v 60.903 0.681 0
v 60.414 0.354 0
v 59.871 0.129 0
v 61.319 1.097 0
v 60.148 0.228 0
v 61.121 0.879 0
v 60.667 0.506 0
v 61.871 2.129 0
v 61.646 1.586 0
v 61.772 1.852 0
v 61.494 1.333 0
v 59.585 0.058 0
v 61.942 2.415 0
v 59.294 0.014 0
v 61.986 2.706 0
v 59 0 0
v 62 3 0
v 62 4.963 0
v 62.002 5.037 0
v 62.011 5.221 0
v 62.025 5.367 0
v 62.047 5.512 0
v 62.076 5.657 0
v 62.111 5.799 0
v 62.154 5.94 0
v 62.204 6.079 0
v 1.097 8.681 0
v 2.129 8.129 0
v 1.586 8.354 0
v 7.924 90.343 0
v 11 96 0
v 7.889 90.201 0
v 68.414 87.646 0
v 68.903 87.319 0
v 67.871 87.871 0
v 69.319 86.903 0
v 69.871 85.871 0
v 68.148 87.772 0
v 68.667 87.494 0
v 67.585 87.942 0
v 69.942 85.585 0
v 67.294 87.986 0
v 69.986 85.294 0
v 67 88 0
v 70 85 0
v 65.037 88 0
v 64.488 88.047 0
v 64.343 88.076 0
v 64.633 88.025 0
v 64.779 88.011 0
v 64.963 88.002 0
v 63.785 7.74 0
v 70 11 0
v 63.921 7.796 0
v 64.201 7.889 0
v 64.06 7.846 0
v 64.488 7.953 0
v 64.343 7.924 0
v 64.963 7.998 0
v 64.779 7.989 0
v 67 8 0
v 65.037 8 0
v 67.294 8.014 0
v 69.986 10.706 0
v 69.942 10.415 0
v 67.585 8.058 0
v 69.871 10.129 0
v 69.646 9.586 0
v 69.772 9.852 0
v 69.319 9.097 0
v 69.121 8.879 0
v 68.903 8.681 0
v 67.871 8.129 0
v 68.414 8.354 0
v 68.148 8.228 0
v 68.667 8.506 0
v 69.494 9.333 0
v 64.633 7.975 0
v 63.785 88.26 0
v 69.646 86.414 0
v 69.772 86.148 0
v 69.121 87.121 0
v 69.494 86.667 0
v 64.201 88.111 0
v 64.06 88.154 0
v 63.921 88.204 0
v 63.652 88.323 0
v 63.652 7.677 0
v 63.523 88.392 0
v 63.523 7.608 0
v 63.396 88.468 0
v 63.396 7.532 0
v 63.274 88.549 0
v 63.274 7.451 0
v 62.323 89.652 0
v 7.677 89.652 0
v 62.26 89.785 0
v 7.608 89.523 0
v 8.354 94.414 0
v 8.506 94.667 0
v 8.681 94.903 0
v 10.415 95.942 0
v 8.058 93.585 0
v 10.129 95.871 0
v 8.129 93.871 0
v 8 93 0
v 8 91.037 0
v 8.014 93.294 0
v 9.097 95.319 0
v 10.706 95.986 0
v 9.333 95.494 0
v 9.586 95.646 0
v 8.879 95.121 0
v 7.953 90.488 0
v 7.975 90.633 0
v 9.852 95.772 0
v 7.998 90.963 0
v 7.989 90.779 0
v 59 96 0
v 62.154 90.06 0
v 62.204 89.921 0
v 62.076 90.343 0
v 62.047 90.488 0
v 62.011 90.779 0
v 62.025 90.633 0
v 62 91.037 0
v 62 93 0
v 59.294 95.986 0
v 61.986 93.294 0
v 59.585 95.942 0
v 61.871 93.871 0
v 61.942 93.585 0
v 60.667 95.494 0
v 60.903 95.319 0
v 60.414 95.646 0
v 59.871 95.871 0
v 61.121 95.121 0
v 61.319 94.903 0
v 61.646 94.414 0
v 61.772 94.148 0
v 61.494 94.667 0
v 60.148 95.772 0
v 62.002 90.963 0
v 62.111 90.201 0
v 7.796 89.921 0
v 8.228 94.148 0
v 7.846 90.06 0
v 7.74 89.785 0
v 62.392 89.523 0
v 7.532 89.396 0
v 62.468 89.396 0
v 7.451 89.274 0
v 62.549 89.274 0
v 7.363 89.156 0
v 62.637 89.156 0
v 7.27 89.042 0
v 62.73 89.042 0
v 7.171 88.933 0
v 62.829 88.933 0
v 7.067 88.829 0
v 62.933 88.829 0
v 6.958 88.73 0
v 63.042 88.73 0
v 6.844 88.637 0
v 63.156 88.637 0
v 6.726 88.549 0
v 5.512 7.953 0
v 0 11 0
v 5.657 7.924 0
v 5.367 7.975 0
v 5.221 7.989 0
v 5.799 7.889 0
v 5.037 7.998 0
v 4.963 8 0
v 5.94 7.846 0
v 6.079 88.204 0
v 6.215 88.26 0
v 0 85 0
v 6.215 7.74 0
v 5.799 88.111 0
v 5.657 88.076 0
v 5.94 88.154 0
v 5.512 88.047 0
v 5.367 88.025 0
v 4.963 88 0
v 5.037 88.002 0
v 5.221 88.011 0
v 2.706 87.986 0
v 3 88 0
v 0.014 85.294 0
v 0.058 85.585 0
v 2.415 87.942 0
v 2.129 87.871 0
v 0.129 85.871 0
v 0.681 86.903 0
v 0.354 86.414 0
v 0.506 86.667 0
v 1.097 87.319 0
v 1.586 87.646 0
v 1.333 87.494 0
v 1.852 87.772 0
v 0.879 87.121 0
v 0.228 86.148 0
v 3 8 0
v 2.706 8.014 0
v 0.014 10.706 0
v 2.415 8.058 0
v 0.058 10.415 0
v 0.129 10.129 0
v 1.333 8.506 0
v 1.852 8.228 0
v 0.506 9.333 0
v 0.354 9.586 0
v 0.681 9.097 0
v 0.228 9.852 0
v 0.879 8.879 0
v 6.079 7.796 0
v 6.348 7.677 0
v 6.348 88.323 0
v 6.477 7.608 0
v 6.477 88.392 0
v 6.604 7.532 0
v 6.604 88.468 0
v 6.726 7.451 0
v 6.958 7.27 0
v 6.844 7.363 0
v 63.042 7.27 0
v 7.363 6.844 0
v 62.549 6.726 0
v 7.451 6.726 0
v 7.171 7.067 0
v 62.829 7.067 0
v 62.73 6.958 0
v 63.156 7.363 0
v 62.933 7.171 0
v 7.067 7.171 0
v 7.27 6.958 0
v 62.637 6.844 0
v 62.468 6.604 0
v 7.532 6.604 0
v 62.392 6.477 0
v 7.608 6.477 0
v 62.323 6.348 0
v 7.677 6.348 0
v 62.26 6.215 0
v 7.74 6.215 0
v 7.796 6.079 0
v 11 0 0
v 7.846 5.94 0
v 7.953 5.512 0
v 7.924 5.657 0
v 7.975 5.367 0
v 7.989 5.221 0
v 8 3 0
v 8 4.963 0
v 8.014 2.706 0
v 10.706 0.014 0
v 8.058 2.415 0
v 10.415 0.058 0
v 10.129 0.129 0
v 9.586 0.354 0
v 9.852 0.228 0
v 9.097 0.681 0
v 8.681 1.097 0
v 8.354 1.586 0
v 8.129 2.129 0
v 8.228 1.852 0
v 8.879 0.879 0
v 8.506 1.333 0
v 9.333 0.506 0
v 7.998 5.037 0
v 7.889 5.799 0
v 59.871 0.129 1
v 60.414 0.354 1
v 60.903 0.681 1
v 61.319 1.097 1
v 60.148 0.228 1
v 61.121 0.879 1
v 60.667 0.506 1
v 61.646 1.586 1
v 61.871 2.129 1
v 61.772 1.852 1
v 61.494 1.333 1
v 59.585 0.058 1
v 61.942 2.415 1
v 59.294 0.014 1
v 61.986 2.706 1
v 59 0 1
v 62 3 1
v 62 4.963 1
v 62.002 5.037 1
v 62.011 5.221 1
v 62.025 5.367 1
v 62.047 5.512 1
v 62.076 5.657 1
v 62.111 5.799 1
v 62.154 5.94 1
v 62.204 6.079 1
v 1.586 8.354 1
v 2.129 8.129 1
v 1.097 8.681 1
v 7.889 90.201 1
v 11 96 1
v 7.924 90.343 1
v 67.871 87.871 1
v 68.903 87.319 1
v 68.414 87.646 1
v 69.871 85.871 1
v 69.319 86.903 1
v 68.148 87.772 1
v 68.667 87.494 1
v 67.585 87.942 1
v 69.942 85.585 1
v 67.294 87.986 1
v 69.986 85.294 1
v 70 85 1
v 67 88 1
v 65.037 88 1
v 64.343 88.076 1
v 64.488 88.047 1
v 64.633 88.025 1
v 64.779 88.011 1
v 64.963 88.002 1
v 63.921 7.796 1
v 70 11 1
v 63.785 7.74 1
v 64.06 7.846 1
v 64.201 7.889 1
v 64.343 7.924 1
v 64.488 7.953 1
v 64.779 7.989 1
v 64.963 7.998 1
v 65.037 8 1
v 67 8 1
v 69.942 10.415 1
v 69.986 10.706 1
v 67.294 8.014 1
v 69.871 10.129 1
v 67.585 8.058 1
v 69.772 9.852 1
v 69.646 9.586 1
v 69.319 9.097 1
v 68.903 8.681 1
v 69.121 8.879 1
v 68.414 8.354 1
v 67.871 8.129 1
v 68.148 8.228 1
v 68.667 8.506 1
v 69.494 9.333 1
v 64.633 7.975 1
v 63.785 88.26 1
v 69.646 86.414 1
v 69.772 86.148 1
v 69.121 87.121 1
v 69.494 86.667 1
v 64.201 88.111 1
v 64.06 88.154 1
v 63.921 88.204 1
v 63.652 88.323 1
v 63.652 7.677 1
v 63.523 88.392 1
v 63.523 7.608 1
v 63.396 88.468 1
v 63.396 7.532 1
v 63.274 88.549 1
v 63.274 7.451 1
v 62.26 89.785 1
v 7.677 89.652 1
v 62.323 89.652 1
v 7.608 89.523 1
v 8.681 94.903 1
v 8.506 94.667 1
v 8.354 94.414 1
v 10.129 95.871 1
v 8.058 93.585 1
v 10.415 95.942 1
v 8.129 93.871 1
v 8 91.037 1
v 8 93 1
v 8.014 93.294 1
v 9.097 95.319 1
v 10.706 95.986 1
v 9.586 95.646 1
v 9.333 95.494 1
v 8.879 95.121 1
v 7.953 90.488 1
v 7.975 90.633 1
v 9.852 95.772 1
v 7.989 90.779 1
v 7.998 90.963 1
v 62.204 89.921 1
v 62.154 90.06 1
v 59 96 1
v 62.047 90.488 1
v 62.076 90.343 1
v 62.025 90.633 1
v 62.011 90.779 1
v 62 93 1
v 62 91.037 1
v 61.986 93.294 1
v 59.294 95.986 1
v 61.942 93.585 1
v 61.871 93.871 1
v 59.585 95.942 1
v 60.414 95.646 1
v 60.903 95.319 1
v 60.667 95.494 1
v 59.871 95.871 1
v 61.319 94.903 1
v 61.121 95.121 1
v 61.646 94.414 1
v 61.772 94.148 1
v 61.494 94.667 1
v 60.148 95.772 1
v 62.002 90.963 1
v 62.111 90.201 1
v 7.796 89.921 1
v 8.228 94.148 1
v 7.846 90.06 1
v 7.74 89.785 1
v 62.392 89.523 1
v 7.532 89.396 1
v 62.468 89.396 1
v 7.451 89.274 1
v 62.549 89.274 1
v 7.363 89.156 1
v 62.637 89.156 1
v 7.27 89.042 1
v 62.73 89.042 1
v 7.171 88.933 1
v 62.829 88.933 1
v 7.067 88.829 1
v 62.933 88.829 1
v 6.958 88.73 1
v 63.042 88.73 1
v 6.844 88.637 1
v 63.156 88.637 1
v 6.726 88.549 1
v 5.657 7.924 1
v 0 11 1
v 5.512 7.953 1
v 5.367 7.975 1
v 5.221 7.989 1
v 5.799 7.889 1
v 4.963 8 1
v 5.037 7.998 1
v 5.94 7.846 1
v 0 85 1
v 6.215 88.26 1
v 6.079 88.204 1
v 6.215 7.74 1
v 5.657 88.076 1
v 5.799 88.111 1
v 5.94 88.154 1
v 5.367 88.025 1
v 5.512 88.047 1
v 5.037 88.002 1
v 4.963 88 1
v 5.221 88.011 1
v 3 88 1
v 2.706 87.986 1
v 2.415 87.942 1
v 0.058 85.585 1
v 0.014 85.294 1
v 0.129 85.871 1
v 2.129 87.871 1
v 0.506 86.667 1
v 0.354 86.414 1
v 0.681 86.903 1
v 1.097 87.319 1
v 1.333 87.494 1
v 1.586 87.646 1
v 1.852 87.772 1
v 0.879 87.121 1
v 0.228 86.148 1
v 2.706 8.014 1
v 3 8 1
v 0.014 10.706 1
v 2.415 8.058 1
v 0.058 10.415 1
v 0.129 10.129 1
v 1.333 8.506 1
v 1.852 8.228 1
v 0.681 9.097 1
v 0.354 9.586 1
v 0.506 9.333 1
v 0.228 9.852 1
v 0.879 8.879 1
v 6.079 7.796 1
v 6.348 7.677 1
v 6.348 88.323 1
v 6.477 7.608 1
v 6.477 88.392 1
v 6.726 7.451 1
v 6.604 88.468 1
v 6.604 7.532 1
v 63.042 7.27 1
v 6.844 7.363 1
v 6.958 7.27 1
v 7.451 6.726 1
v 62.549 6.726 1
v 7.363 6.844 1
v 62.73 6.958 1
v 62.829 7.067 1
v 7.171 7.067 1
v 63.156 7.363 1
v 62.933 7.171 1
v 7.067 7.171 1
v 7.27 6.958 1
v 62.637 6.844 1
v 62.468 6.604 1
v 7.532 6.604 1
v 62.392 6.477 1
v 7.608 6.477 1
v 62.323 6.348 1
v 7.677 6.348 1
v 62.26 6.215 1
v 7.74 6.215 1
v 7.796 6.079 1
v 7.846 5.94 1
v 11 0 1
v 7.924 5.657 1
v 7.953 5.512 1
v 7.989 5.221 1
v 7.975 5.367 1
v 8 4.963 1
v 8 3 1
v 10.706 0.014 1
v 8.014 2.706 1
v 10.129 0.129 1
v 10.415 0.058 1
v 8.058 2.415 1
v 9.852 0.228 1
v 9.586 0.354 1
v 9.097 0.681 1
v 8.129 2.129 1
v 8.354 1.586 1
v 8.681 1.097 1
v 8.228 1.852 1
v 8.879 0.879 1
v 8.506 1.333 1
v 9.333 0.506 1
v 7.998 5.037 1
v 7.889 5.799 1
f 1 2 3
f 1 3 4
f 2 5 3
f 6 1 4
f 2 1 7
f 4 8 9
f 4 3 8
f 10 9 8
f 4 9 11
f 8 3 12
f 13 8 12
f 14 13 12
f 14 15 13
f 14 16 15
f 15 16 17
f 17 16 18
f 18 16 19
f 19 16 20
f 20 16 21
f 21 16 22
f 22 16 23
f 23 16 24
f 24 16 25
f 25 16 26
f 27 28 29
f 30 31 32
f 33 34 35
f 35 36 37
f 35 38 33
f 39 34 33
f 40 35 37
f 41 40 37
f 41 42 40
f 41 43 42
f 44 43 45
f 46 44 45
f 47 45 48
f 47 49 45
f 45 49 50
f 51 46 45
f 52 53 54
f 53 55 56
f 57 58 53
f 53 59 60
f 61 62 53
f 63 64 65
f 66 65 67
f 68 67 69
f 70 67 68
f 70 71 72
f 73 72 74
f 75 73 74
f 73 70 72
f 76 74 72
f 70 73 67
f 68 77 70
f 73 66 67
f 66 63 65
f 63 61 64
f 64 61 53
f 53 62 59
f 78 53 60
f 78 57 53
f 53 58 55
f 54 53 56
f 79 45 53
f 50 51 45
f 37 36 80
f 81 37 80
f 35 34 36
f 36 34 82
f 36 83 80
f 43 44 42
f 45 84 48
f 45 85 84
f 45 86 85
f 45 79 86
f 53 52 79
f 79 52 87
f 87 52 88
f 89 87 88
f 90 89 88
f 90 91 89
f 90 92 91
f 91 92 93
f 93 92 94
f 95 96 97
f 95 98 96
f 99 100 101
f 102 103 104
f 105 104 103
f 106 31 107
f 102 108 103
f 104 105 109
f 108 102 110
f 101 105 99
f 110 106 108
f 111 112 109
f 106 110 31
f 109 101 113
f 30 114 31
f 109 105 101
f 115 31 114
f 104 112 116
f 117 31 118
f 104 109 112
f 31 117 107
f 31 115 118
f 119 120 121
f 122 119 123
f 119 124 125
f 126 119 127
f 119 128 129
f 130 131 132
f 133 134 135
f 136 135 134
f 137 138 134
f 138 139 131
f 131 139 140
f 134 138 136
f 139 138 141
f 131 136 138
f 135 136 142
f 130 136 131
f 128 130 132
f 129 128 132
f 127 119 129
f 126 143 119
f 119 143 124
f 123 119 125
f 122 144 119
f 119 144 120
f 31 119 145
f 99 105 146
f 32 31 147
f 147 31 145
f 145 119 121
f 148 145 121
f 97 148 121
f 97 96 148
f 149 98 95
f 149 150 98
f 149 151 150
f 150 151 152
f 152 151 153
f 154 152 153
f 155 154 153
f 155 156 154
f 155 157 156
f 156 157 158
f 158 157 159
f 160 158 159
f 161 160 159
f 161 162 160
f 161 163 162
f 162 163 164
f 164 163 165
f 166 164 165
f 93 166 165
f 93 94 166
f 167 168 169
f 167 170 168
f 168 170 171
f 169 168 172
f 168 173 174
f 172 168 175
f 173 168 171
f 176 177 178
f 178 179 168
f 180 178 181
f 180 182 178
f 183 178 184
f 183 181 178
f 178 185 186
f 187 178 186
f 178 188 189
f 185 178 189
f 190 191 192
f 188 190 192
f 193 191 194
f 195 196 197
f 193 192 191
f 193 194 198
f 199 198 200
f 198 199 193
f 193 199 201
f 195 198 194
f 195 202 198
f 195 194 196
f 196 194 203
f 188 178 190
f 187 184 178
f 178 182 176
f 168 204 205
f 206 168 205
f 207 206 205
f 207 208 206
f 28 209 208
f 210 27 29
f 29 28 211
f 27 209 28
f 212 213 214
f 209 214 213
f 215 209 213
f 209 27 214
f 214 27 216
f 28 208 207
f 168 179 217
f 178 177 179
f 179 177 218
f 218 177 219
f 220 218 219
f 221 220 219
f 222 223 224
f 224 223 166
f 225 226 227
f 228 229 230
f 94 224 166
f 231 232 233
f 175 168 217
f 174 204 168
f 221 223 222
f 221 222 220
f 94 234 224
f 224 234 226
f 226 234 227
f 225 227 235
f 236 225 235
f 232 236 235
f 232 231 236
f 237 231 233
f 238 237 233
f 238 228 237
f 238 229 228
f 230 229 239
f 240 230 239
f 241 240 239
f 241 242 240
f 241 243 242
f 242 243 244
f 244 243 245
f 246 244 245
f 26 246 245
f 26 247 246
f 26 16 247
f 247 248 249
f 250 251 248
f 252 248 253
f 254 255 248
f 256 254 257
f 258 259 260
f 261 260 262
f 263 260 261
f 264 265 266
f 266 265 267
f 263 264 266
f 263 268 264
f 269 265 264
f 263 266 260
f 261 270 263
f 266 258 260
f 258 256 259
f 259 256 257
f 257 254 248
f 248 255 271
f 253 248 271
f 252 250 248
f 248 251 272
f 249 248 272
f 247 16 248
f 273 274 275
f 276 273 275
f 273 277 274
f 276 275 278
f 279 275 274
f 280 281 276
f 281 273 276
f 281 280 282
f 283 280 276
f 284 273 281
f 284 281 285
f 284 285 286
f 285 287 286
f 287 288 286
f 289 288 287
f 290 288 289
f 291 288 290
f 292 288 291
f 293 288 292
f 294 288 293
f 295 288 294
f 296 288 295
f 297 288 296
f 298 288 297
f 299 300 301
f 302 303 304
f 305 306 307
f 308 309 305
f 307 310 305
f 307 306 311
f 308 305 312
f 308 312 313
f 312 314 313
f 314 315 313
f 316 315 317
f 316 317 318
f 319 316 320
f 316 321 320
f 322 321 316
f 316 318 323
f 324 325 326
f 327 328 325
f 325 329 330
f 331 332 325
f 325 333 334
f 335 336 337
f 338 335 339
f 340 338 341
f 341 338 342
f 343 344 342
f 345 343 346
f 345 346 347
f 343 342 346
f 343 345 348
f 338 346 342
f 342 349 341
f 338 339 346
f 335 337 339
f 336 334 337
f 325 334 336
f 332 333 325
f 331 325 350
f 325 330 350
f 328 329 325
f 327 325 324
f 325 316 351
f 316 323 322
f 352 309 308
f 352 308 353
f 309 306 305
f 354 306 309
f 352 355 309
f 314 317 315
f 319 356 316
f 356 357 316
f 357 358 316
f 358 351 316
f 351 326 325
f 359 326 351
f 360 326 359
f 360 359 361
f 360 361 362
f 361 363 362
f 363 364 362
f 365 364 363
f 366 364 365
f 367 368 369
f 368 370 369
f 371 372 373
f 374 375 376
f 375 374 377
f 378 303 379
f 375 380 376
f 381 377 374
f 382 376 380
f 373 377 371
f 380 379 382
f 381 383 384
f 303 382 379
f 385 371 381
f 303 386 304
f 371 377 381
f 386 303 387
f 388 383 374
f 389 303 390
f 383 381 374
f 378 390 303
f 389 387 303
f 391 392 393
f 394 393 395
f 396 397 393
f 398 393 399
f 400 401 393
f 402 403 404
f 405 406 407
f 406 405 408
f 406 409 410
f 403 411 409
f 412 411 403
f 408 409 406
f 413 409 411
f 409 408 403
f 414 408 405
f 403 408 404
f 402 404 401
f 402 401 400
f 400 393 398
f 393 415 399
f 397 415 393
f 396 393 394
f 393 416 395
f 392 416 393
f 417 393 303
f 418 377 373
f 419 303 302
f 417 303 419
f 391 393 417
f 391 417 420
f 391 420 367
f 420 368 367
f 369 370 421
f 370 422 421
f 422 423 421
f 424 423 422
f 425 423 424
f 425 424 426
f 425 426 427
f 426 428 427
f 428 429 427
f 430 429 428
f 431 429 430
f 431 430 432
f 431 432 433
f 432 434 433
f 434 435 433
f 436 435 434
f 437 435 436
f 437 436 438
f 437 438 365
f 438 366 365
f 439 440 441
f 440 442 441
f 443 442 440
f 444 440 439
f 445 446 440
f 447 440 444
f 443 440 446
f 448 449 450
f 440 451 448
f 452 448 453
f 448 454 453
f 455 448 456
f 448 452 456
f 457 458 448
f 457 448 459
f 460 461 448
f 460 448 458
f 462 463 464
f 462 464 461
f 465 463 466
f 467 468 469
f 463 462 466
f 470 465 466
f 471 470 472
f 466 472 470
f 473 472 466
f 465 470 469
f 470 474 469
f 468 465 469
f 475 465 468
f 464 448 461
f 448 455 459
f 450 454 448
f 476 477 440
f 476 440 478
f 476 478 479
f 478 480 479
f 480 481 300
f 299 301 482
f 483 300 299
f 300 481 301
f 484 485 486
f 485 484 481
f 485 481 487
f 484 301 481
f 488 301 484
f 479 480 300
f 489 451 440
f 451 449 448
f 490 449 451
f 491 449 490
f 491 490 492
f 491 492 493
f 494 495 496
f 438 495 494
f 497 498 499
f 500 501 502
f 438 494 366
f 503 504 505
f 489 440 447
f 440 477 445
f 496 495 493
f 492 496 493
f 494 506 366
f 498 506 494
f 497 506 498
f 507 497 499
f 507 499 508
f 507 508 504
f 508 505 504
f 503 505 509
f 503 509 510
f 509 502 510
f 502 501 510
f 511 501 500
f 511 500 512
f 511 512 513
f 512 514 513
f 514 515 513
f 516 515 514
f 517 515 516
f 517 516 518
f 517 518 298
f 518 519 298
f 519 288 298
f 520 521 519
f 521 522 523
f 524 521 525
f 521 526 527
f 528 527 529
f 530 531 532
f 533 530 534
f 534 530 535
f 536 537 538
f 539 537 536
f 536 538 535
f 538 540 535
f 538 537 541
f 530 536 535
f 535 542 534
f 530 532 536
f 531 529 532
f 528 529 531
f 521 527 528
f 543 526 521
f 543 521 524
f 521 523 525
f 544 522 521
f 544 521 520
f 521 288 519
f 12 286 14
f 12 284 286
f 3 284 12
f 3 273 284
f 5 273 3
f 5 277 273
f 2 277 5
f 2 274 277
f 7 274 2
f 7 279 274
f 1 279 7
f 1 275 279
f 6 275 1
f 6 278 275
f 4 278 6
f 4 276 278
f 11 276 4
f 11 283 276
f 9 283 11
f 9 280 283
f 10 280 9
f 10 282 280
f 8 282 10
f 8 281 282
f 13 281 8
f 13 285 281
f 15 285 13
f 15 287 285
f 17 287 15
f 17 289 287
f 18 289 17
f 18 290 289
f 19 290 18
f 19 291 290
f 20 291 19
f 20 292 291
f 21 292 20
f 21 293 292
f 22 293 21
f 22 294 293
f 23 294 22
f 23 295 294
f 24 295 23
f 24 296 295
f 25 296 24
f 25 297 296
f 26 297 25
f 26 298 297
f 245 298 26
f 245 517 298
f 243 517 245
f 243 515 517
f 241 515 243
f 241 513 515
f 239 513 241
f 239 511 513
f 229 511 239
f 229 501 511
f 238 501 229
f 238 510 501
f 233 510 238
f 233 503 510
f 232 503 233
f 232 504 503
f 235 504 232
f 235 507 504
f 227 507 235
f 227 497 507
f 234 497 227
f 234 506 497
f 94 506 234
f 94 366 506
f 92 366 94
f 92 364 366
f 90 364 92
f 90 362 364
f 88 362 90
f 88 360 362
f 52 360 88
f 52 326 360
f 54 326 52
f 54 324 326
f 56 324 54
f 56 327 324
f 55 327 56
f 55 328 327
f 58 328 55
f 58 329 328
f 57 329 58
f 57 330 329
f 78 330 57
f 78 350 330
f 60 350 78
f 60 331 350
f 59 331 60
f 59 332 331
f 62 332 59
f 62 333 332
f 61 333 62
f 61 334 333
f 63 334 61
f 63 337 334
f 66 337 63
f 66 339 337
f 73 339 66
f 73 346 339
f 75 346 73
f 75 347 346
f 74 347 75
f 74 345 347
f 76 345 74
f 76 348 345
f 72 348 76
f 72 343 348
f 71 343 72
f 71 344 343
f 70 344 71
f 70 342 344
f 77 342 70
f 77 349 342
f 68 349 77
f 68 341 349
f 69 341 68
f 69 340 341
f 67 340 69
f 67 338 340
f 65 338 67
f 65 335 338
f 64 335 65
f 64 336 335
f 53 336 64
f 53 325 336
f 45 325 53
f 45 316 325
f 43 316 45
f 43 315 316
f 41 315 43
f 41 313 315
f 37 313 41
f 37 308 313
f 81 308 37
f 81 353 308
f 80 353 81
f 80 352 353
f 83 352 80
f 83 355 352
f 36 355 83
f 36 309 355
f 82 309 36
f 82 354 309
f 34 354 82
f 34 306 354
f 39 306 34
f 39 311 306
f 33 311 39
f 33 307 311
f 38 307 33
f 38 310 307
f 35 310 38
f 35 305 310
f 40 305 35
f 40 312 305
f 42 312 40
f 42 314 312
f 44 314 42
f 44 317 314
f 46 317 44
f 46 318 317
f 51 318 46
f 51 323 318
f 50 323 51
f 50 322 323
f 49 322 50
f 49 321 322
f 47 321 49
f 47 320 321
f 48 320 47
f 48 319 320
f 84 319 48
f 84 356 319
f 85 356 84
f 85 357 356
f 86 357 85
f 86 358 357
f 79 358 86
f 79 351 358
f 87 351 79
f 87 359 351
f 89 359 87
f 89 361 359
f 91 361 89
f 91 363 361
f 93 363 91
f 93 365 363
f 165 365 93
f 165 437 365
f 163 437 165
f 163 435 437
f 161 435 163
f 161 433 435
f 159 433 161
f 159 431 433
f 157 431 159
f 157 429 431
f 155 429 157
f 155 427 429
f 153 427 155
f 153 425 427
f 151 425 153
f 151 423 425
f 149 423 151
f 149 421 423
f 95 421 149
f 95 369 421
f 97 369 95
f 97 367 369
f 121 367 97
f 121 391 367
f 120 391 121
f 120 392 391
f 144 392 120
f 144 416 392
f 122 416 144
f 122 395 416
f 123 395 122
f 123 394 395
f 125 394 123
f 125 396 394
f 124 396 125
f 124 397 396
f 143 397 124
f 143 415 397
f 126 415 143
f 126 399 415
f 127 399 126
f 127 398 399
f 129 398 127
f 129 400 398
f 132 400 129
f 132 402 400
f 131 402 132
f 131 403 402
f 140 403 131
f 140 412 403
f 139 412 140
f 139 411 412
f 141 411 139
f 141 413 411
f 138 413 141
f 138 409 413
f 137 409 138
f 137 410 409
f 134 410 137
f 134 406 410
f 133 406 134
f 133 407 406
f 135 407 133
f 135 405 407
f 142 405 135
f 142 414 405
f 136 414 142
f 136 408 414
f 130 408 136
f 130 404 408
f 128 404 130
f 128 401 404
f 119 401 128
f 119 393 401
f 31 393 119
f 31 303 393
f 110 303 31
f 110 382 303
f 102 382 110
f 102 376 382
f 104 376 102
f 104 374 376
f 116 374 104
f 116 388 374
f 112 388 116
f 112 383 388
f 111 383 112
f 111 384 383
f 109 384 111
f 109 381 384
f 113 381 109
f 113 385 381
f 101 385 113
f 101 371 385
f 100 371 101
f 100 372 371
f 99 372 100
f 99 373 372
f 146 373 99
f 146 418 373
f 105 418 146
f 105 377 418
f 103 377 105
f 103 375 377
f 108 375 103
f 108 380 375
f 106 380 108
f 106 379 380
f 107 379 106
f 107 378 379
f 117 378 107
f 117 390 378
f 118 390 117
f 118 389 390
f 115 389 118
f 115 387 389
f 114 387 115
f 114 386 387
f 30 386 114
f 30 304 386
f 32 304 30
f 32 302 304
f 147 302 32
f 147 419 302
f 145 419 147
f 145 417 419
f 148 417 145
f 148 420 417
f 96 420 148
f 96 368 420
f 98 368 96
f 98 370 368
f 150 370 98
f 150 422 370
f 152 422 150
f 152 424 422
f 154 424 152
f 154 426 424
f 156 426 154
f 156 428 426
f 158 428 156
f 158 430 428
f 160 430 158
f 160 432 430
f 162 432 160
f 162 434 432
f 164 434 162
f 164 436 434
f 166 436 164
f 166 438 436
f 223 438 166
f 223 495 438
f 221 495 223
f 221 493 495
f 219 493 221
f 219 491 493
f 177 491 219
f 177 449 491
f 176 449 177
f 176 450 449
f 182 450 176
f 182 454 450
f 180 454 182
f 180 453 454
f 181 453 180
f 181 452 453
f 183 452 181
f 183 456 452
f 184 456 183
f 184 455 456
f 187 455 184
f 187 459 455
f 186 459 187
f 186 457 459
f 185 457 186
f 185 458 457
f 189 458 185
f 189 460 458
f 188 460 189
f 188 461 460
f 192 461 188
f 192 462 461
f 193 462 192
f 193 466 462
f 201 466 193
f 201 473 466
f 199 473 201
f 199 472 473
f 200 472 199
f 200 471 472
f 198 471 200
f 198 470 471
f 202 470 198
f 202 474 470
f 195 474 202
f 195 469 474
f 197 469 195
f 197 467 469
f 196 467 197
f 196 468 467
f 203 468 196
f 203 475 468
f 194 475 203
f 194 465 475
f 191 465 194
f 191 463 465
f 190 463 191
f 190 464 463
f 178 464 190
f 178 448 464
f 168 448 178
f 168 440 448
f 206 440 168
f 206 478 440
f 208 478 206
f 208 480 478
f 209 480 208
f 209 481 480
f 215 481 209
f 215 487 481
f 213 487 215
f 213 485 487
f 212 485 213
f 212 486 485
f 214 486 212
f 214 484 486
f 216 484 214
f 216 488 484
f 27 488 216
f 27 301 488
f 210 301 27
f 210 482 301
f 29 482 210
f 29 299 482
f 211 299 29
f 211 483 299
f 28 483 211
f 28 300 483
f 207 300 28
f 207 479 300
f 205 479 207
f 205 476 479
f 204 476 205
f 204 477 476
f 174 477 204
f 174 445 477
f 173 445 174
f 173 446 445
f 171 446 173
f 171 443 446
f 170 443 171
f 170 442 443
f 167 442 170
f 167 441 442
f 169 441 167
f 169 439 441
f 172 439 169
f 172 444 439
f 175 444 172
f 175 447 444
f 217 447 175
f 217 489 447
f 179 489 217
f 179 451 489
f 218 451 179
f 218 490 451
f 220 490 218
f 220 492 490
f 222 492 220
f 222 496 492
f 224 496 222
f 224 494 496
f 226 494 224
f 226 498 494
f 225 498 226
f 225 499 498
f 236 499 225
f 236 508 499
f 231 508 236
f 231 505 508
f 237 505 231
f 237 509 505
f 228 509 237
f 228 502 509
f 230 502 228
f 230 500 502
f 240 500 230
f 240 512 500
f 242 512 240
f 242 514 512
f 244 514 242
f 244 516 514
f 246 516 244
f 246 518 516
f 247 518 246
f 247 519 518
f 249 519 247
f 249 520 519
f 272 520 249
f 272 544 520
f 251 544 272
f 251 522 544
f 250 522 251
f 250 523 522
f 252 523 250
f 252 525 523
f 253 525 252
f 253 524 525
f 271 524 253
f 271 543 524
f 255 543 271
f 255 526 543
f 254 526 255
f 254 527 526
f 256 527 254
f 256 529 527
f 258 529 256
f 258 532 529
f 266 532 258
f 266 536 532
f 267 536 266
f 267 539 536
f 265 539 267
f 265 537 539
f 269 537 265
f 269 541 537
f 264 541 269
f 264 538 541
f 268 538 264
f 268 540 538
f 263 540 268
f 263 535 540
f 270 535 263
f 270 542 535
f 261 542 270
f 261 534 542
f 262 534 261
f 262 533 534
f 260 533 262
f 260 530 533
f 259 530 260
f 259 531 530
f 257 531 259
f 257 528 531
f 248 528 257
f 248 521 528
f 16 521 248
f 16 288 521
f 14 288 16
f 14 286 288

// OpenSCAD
//Card Separator for MTG Deck Boxes

height = 96;
width = 70;
thickness = 1;
corner_cutout_height = 8;
corner_cutout_width = 8;
rounding_radius = 3;

linear_extrude(thickness)
    offset( r =  rounding_radius, $fn=64)   // ④ re-expand  → convex corners now smooth
    offset( r = -rounding_radius, $fn=64)   // ③ shrink     → clips convex sharpness
    offset( r = -rounding_radius, $fn=64)   // ② shrink     → reverts expansion
    offset( r =  rounding_radius, $fn=64)   // ① expand     → fills concave inner corner
    difference() {
        square([width, height]);
        square([corner_cutout_width, corner_cutout_height]);  // cuts bottom-left corner
        translate([width - corner_cutout_width, 0])
            square([corner_cutout_width, corner_cutout_height]); // cuts bottom-right corner
        translate([0, height - corner_cutout_height])
            square([corner_cutout_width, corner_cutout_height]); // cuts top-left corner
        translate([width - corner_cutout_width, height - corner_cutout_height])
            square([corner_cutout_width, corner_cutout_height]); // cuts top-right corner
}
